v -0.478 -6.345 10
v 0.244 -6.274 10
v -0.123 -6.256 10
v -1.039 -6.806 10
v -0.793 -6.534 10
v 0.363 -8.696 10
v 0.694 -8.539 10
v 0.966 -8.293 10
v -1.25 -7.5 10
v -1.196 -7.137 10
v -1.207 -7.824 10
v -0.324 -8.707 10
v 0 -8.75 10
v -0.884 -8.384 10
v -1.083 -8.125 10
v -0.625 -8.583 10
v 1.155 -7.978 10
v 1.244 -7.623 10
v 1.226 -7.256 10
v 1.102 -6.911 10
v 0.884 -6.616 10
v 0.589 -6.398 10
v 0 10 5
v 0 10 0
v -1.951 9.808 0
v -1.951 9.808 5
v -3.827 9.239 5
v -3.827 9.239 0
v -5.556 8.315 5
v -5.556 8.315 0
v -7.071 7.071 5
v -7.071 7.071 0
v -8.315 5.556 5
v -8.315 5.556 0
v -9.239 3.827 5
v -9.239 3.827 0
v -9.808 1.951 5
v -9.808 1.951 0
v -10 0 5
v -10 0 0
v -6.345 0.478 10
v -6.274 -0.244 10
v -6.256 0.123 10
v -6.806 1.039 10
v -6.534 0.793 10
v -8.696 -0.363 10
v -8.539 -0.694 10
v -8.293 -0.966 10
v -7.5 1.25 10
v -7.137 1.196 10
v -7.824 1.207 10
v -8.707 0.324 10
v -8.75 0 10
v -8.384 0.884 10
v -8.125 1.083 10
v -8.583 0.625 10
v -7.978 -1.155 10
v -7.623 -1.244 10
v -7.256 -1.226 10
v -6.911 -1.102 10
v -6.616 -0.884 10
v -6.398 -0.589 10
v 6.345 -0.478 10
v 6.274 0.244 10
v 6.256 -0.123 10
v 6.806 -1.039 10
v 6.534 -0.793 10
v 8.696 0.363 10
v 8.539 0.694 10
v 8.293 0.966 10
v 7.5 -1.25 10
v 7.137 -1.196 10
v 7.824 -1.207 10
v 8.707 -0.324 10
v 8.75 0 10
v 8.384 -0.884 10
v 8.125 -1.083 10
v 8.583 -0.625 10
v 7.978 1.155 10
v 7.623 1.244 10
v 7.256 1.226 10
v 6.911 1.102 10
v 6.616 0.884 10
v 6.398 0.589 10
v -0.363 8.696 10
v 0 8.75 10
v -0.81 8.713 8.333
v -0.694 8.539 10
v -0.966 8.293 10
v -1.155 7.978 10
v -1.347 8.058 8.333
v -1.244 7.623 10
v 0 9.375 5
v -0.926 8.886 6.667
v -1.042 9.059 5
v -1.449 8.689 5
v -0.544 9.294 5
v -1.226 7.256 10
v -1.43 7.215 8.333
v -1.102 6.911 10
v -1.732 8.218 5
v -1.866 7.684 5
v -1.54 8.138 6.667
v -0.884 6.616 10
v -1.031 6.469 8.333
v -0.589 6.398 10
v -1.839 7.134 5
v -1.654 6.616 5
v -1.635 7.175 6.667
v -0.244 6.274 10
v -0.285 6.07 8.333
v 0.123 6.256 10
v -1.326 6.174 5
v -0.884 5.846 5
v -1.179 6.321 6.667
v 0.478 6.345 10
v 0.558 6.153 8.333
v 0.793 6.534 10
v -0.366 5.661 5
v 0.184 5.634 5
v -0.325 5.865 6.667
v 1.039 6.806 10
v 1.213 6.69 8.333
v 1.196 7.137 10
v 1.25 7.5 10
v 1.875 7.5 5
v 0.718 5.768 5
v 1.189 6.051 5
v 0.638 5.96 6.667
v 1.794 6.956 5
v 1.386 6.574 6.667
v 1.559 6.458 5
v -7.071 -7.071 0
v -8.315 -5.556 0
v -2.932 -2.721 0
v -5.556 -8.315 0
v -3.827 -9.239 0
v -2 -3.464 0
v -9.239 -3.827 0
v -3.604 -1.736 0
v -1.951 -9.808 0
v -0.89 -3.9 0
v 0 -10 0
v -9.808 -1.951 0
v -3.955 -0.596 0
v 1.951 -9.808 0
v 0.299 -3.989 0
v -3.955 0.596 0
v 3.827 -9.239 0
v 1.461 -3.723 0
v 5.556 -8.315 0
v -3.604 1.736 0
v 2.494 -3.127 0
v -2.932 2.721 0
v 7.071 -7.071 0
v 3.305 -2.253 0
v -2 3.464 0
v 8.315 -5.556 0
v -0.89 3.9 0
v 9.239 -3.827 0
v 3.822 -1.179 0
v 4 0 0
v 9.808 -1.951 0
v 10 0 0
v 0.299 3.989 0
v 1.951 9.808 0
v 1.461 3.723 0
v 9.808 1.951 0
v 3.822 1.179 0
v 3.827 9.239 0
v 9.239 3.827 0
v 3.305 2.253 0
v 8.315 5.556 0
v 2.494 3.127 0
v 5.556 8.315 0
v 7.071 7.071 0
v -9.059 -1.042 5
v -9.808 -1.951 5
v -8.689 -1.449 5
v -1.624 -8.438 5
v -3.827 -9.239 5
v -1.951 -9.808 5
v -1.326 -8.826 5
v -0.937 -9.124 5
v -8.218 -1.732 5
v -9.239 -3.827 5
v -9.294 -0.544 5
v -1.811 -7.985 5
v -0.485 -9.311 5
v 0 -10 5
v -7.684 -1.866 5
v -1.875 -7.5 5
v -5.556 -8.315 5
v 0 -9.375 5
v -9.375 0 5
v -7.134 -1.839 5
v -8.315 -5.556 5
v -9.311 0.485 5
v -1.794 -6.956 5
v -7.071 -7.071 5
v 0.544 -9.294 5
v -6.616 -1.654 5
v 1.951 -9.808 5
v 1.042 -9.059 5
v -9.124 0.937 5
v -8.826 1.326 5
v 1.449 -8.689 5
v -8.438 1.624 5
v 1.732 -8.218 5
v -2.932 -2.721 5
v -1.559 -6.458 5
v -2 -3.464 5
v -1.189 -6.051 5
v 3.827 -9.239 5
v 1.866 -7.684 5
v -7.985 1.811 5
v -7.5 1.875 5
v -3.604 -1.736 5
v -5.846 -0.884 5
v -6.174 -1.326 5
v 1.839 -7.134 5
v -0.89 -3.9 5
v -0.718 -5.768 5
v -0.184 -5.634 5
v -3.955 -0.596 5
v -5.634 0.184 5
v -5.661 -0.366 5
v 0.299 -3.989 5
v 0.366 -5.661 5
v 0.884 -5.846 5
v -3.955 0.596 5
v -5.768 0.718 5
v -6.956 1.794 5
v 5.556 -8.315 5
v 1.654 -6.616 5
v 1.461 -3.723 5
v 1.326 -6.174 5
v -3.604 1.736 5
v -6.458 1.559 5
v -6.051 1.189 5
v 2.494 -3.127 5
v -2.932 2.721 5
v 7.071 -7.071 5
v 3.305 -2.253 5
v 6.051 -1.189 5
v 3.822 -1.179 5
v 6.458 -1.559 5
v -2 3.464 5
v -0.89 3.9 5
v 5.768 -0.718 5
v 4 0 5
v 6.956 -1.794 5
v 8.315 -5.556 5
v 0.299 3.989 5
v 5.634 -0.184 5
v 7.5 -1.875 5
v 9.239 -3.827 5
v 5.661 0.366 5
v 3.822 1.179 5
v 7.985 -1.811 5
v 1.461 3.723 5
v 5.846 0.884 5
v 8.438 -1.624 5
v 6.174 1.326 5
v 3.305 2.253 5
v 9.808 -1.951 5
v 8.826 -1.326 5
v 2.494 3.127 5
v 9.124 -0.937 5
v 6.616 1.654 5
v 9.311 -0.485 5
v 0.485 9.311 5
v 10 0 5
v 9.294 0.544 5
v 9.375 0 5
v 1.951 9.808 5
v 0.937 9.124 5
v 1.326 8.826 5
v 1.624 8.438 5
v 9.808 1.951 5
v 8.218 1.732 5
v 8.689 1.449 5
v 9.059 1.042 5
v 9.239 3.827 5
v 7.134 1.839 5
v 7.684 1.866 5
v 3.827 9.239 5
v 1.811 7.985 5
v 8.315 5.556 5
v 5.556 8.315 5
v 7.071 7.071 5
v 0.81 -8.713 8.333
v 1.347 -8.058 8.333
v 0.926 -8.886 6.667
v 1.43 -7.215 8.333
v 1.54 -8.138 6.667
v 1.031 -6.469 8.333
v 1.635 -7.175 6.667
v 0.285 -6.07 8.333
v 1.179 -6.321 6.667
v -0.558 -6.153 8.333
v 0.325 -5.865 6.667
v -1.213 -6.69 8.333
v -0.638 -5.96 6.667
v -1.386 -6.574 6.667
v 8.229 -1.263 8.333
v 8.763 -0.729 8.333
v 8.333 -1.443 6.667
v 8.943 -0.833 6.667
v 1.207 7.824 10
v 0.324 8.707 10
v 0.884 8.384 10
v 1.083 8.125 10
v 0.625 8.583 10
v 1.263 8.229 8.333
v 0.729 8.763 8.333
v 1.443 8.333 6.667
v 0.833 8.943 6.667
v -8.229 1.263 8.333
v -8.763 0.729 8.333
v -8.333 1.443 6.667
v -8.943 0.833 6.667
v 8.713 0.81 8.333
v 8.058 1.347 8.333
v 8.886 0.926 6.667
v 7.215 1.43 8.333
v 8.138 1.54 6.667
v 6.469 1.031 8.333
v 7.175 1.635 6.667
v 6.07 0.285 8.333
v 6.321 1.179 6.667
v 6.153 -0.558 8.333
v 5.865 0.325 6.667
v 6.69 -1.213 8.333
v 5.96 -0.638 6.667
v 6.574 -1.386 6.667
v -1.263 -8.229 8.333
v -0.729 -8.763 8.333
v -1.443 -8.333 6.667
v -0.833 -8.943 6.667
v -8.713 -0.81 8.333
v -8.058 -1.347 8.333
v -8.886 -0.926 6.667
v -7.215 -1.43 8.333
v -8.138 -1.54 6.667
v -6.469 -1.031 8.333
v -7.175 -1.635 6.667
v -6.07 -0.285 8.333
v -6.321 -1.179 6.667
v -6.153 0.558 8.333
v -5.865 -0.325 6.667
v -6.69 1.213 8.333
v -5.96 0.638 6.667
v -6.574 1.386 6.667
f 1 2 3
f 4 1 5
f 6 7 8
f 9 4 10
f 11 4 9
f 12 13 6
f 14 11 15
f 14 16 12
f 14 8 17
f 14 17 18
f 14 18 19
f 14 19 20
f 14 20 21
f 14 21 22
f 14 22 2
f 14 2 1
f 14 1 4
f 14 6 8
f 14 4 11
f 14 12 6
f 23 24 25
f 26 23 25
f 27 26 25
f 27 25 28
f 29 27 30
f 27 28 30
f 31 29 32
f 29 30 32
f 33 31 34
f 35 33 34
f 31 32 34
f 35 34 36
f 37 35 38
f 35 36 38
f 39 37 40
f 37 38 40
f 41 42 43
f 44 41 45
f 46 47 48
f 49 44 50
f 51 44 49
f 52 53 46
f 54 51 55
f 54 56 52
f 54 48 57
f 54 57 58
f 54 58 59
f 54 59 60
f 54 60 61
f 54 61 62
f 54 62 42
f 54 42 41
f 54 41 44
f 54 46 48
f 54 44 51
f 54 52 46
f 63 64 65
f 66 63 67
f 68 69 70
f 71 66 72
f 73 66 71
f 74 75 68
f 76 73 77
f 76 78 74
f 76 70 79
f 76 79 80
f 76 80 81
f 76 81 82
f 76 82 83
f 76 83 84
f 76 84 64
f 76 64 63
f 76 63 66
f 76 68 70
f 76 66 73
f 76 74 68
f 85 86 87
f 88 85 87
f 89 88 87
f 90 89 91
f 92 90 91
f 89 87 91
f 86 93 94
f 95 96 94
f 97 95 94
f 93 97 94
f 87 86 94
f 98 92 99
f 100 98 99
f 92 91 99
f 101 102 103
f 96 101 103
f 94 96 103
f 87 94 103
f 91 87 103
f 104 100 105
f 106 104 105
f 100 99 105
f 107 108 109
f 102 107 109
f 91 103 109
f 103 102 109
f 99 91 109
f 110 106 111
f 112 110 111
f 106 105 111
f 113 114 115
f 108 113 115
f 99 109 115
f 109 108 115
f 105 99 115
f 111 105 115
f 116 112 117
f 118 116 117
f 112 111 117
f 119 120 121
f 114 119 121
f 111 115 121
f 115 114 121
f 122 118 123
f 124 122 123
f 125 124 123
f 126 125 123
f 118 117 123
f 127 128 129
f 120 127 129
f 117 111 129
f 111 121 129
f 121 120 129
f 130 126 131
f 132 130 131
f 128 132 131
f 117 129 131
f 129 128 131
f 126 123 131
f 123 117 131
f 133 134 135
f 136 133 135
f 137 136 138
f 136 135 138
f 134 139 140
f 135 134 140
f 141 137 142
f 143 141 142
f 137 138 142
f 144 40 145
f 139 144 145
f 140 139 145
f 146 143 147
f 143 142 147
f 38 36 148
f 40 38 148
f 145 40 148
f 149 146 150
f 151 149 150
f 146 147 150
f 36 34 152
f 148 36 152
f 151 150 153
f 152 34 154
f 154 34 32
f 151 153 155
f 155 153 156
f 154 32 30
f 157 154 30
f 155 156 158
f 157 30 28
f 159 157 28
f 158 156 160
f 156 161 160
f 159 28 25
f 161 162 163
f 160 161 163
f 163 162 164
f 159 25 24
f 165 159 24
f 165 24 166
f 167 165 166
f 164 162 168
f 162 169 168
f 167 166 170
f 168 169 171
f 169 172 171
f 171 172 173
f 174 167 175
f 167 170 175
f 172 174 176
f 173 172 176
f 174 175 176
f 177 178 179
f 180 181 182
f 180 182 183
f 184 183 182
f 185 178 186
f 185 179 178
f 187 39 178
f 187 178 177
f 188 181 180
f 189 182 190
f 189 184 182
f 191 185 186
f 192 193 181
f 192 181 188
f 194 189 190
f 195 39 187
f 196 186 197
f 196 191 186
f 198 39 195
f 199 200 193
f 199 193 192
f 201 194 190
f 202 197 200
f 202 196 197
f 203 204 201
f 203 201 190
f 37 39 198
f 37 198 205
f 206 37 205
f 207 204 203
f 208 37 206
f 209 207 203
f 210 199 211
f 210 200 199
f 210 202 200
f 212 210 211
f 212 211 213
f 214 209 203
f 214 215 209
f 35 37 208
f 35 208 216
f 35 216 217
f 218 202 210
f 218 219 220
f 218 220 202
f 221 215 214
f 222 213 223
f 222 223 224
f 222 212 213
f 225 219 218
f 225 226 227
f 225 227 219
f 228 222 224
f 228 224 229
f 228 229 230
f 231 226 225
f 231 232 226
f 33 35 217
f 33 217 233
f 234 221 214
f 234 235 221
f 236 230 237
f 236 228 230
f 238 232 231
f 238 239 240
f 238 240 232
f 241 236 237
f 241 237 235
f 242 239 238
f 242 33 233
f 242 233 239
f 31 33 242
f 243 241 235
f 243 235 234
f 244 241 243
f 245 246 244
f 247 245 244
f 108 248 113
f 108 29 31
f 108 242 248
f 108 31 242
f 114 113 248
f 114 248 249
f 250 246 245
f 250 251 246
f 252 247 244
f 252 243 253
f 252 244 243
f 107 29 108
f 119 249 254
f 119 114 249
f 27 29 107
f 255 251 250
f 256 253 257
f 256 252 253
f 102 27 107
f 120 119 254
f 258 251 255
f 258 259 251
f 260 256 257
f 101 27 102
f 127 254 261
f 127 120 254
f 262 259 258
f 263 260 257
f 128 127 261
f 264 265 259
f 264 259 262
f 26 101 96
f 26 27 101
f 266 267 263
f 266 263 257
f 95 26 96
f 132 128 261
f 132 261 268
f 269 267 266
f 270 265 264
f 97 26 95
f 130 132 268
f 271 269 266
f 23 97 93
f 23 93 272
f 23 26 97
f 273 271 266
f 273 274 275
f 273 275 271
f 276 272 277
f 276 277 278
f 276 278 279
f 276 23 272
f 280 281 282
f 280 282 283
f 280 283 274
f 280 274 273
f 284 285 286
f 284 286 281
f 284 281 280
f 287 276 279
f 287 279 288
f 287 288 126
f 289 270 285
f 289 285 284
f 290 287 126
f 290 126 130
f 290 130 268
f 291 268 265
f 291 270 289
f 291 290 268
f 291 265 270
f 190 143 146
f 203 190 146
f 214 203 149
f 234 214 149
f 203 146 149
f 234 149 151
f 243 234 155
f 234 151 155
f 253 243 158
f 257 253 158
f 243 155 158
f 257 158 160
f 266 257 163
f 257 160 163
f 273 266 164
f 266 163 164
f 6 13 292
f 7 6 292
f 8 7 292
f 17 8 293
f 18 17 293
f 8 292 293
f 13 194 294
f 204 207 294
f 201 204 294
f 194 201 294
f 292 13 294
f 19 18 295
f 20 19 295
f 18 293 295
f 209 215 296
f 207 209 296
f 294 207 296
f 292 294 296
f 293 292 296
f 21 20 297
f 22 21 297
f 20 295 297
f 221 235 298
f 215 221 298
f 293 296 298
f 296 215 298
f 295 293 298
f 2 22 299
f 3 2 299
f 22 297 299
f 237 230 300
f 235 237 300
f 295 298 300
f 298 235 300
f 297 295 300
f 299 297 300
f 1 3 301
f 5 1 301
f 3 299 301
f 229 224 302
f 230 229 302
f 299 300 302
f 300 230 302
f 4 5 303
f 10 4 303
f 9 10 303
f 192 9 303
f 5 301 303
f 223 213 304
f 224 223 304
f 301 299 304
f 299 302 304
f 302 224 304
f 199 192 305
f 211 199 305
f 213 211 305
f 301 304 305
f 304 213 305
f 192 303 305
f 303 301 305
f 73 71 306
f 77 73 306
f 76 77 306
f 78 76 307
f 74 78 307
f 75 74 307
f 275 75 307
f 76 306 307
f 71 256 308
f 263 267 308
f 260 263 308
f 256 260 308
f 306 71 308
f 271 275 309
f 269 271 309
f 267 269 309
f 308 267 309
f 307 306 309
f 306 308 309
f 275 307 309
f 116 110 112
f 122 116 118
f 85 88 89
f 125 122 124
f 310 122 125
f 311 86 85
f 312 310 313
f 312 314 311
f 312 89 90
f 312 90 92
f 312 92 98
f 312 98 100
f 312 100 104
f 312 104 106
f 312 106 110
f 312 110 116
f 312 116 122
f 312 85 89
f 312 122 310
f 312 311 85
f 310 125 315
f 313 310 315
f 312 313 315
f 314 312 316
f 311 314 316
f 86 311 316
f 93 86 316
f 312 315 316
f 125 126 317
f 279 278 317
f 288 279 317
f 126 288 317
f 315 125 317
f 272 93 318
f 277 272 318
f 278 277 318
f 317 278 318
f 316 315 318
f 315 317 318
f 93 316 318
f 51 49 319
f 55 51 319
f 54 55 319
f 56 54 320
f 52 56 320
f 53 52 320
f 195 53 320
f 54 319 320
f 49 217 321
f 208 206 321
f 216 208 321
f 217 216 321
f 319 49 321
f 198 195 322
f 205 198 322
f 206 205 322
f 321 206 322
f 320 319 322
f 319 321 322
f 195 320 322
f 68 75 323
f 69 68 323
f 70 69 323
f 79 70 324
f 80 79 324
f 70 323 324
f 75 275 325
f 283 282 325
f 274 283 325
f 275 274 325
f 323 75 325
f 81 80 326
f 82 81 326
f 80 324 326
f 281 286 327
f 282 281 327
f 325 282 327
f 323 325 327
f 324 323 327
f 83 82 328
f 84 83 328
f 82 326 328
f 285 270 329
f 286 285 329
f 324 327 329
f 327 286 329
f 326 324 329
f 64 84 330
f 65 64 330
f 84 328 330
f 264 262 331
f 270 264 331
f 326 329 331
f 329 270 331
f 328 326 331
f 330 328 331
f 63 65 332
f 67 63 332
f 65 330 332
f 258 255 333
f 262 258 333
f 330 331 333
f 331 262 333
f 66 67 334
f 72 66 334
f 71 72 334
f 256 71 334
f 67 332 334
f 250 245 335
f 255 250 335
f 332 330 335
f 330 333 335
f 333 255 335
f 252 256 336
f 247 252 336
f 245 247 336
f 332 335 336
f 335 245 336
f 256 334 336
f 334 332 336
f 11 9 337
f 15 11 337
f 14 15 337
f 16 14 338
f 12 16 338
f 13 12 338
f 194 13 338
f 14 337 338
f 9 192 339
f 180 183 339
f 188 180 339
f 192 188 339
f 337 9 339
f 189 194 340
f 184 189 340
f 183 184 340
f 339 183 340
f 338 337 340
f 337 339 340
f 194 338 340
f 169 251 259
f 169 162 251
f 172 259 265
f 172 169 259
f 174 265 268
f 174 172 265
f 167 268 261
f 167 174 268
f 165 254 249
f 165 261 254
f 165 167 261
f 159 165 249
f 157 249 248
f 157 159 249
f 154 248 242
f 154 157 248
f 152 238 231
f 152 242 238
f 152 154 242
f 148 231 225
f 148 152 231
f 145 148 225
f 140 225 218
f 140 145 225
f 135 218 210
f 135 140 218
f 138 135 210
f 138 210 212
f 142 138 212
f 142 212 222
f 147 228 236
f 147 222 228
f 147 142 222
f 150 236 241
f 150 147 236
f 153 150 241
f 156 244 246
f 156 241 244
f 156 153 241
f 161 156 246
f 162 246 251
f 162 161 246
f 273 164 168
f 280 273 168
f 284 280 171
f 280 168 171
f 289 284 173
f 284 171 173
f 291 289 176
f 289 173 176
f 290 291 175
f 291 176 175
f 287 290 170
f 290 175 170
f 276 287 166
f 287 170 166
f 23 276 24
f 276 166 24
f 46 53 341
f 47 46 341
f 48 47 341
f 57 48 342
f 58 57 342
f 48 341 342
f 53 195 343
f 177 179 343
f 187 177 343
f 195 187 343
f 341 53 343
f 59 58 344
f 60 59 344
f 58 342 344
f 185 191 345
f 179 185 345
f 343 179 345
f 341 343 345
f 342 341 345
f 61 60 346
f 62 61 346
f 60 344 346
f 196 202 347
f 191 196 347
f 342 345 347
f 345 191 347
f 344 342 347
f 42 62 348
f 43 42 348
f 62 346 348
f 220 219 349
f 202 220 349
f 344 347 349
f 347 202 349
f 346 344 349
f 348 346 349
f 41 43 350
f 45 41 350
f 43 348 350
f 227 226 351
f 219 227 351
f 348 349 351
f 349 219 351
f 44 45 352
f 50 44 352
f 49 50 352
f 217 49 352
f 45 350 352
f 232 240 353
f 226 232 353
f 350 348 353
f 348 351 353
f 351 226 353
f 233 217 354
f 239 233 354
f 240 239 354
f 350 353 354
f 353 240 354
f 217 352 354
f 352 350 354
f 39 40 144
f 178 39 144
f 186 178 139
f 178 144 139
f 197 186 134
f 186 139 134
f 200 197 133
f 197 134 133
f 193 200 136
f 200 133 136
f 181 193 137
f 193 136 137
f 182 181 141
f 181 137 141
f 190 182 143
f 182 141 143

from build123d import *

# Parameters (mm, degrees)
F0_R     = 4
F1_DEPTH = 5
F3_R     = 1.25
F6_COUNT = 4


# Not quite as in the source:
# - a feature names something its author has since deleted; it is built from what else it names


with BuildPart() as f1:
    # F0 (on Top) → F1 (new body)
    with BuildSketch(Plane.XY):
        with BuildLine():
            ThreePointArc((0, 10), (-7.0710678119, -7.0710678119), (10, 0))
            ThreePointArc((10, 0), (7.0710678119, 7.0710678119), (0, 10))
        make_face()
        Circle(F0_R, mode=Mode.SUBTRACT)
        with BuildLine():
            ThreePointArc((2.5, 7.5), (-1.767766953, 5.732233047), (0, 10))
            ThreePointArc((0, 10), (1.767766953, 9.267766953), (2.5, 7.5))
        make_face(mode=Mode.SUBTRACT)
        with BuildLine():
            ThreePointArc((2.5, 7.5), (1.767766953, 9.267766953), (0, 10))
            ThreePointArc((0, 10), (-1.767766953, 5.732233047), (2.5, 7.5))
        make_face()
    extrude(amount=F1_DEPTH)

    # F3 (on offset) → F4 section 0
    with BuildSketch(Plane.XY.offset(10)):
        with Locations((0, 7.5)):
            Circle(F3_R)
    # F0 (on Top) → F4 section 1
    with BuildSketch(Plane.XY):
        with BuildLine():
            ThreePointArc((2.5, 7.5), (1.767766953, 9.267766953), (0, 10))
            ThreePointArc((0, 10), (-1.767766953, 5.732233047), (2.5, 7.5))
        make_face()
    loft()

    # F6: F1 ×4 about axis
    f6_axis = Axis((0, 0, 16.9871691614), (0, 0, 1))


with BuildPart() as f1_1:
    add(f1.part)
    for i in range(1, F6_COUNT):
        add(f1.part.rotate(f6_axis, i * 360 / F6_COUNT))


solid = f1_1.part
